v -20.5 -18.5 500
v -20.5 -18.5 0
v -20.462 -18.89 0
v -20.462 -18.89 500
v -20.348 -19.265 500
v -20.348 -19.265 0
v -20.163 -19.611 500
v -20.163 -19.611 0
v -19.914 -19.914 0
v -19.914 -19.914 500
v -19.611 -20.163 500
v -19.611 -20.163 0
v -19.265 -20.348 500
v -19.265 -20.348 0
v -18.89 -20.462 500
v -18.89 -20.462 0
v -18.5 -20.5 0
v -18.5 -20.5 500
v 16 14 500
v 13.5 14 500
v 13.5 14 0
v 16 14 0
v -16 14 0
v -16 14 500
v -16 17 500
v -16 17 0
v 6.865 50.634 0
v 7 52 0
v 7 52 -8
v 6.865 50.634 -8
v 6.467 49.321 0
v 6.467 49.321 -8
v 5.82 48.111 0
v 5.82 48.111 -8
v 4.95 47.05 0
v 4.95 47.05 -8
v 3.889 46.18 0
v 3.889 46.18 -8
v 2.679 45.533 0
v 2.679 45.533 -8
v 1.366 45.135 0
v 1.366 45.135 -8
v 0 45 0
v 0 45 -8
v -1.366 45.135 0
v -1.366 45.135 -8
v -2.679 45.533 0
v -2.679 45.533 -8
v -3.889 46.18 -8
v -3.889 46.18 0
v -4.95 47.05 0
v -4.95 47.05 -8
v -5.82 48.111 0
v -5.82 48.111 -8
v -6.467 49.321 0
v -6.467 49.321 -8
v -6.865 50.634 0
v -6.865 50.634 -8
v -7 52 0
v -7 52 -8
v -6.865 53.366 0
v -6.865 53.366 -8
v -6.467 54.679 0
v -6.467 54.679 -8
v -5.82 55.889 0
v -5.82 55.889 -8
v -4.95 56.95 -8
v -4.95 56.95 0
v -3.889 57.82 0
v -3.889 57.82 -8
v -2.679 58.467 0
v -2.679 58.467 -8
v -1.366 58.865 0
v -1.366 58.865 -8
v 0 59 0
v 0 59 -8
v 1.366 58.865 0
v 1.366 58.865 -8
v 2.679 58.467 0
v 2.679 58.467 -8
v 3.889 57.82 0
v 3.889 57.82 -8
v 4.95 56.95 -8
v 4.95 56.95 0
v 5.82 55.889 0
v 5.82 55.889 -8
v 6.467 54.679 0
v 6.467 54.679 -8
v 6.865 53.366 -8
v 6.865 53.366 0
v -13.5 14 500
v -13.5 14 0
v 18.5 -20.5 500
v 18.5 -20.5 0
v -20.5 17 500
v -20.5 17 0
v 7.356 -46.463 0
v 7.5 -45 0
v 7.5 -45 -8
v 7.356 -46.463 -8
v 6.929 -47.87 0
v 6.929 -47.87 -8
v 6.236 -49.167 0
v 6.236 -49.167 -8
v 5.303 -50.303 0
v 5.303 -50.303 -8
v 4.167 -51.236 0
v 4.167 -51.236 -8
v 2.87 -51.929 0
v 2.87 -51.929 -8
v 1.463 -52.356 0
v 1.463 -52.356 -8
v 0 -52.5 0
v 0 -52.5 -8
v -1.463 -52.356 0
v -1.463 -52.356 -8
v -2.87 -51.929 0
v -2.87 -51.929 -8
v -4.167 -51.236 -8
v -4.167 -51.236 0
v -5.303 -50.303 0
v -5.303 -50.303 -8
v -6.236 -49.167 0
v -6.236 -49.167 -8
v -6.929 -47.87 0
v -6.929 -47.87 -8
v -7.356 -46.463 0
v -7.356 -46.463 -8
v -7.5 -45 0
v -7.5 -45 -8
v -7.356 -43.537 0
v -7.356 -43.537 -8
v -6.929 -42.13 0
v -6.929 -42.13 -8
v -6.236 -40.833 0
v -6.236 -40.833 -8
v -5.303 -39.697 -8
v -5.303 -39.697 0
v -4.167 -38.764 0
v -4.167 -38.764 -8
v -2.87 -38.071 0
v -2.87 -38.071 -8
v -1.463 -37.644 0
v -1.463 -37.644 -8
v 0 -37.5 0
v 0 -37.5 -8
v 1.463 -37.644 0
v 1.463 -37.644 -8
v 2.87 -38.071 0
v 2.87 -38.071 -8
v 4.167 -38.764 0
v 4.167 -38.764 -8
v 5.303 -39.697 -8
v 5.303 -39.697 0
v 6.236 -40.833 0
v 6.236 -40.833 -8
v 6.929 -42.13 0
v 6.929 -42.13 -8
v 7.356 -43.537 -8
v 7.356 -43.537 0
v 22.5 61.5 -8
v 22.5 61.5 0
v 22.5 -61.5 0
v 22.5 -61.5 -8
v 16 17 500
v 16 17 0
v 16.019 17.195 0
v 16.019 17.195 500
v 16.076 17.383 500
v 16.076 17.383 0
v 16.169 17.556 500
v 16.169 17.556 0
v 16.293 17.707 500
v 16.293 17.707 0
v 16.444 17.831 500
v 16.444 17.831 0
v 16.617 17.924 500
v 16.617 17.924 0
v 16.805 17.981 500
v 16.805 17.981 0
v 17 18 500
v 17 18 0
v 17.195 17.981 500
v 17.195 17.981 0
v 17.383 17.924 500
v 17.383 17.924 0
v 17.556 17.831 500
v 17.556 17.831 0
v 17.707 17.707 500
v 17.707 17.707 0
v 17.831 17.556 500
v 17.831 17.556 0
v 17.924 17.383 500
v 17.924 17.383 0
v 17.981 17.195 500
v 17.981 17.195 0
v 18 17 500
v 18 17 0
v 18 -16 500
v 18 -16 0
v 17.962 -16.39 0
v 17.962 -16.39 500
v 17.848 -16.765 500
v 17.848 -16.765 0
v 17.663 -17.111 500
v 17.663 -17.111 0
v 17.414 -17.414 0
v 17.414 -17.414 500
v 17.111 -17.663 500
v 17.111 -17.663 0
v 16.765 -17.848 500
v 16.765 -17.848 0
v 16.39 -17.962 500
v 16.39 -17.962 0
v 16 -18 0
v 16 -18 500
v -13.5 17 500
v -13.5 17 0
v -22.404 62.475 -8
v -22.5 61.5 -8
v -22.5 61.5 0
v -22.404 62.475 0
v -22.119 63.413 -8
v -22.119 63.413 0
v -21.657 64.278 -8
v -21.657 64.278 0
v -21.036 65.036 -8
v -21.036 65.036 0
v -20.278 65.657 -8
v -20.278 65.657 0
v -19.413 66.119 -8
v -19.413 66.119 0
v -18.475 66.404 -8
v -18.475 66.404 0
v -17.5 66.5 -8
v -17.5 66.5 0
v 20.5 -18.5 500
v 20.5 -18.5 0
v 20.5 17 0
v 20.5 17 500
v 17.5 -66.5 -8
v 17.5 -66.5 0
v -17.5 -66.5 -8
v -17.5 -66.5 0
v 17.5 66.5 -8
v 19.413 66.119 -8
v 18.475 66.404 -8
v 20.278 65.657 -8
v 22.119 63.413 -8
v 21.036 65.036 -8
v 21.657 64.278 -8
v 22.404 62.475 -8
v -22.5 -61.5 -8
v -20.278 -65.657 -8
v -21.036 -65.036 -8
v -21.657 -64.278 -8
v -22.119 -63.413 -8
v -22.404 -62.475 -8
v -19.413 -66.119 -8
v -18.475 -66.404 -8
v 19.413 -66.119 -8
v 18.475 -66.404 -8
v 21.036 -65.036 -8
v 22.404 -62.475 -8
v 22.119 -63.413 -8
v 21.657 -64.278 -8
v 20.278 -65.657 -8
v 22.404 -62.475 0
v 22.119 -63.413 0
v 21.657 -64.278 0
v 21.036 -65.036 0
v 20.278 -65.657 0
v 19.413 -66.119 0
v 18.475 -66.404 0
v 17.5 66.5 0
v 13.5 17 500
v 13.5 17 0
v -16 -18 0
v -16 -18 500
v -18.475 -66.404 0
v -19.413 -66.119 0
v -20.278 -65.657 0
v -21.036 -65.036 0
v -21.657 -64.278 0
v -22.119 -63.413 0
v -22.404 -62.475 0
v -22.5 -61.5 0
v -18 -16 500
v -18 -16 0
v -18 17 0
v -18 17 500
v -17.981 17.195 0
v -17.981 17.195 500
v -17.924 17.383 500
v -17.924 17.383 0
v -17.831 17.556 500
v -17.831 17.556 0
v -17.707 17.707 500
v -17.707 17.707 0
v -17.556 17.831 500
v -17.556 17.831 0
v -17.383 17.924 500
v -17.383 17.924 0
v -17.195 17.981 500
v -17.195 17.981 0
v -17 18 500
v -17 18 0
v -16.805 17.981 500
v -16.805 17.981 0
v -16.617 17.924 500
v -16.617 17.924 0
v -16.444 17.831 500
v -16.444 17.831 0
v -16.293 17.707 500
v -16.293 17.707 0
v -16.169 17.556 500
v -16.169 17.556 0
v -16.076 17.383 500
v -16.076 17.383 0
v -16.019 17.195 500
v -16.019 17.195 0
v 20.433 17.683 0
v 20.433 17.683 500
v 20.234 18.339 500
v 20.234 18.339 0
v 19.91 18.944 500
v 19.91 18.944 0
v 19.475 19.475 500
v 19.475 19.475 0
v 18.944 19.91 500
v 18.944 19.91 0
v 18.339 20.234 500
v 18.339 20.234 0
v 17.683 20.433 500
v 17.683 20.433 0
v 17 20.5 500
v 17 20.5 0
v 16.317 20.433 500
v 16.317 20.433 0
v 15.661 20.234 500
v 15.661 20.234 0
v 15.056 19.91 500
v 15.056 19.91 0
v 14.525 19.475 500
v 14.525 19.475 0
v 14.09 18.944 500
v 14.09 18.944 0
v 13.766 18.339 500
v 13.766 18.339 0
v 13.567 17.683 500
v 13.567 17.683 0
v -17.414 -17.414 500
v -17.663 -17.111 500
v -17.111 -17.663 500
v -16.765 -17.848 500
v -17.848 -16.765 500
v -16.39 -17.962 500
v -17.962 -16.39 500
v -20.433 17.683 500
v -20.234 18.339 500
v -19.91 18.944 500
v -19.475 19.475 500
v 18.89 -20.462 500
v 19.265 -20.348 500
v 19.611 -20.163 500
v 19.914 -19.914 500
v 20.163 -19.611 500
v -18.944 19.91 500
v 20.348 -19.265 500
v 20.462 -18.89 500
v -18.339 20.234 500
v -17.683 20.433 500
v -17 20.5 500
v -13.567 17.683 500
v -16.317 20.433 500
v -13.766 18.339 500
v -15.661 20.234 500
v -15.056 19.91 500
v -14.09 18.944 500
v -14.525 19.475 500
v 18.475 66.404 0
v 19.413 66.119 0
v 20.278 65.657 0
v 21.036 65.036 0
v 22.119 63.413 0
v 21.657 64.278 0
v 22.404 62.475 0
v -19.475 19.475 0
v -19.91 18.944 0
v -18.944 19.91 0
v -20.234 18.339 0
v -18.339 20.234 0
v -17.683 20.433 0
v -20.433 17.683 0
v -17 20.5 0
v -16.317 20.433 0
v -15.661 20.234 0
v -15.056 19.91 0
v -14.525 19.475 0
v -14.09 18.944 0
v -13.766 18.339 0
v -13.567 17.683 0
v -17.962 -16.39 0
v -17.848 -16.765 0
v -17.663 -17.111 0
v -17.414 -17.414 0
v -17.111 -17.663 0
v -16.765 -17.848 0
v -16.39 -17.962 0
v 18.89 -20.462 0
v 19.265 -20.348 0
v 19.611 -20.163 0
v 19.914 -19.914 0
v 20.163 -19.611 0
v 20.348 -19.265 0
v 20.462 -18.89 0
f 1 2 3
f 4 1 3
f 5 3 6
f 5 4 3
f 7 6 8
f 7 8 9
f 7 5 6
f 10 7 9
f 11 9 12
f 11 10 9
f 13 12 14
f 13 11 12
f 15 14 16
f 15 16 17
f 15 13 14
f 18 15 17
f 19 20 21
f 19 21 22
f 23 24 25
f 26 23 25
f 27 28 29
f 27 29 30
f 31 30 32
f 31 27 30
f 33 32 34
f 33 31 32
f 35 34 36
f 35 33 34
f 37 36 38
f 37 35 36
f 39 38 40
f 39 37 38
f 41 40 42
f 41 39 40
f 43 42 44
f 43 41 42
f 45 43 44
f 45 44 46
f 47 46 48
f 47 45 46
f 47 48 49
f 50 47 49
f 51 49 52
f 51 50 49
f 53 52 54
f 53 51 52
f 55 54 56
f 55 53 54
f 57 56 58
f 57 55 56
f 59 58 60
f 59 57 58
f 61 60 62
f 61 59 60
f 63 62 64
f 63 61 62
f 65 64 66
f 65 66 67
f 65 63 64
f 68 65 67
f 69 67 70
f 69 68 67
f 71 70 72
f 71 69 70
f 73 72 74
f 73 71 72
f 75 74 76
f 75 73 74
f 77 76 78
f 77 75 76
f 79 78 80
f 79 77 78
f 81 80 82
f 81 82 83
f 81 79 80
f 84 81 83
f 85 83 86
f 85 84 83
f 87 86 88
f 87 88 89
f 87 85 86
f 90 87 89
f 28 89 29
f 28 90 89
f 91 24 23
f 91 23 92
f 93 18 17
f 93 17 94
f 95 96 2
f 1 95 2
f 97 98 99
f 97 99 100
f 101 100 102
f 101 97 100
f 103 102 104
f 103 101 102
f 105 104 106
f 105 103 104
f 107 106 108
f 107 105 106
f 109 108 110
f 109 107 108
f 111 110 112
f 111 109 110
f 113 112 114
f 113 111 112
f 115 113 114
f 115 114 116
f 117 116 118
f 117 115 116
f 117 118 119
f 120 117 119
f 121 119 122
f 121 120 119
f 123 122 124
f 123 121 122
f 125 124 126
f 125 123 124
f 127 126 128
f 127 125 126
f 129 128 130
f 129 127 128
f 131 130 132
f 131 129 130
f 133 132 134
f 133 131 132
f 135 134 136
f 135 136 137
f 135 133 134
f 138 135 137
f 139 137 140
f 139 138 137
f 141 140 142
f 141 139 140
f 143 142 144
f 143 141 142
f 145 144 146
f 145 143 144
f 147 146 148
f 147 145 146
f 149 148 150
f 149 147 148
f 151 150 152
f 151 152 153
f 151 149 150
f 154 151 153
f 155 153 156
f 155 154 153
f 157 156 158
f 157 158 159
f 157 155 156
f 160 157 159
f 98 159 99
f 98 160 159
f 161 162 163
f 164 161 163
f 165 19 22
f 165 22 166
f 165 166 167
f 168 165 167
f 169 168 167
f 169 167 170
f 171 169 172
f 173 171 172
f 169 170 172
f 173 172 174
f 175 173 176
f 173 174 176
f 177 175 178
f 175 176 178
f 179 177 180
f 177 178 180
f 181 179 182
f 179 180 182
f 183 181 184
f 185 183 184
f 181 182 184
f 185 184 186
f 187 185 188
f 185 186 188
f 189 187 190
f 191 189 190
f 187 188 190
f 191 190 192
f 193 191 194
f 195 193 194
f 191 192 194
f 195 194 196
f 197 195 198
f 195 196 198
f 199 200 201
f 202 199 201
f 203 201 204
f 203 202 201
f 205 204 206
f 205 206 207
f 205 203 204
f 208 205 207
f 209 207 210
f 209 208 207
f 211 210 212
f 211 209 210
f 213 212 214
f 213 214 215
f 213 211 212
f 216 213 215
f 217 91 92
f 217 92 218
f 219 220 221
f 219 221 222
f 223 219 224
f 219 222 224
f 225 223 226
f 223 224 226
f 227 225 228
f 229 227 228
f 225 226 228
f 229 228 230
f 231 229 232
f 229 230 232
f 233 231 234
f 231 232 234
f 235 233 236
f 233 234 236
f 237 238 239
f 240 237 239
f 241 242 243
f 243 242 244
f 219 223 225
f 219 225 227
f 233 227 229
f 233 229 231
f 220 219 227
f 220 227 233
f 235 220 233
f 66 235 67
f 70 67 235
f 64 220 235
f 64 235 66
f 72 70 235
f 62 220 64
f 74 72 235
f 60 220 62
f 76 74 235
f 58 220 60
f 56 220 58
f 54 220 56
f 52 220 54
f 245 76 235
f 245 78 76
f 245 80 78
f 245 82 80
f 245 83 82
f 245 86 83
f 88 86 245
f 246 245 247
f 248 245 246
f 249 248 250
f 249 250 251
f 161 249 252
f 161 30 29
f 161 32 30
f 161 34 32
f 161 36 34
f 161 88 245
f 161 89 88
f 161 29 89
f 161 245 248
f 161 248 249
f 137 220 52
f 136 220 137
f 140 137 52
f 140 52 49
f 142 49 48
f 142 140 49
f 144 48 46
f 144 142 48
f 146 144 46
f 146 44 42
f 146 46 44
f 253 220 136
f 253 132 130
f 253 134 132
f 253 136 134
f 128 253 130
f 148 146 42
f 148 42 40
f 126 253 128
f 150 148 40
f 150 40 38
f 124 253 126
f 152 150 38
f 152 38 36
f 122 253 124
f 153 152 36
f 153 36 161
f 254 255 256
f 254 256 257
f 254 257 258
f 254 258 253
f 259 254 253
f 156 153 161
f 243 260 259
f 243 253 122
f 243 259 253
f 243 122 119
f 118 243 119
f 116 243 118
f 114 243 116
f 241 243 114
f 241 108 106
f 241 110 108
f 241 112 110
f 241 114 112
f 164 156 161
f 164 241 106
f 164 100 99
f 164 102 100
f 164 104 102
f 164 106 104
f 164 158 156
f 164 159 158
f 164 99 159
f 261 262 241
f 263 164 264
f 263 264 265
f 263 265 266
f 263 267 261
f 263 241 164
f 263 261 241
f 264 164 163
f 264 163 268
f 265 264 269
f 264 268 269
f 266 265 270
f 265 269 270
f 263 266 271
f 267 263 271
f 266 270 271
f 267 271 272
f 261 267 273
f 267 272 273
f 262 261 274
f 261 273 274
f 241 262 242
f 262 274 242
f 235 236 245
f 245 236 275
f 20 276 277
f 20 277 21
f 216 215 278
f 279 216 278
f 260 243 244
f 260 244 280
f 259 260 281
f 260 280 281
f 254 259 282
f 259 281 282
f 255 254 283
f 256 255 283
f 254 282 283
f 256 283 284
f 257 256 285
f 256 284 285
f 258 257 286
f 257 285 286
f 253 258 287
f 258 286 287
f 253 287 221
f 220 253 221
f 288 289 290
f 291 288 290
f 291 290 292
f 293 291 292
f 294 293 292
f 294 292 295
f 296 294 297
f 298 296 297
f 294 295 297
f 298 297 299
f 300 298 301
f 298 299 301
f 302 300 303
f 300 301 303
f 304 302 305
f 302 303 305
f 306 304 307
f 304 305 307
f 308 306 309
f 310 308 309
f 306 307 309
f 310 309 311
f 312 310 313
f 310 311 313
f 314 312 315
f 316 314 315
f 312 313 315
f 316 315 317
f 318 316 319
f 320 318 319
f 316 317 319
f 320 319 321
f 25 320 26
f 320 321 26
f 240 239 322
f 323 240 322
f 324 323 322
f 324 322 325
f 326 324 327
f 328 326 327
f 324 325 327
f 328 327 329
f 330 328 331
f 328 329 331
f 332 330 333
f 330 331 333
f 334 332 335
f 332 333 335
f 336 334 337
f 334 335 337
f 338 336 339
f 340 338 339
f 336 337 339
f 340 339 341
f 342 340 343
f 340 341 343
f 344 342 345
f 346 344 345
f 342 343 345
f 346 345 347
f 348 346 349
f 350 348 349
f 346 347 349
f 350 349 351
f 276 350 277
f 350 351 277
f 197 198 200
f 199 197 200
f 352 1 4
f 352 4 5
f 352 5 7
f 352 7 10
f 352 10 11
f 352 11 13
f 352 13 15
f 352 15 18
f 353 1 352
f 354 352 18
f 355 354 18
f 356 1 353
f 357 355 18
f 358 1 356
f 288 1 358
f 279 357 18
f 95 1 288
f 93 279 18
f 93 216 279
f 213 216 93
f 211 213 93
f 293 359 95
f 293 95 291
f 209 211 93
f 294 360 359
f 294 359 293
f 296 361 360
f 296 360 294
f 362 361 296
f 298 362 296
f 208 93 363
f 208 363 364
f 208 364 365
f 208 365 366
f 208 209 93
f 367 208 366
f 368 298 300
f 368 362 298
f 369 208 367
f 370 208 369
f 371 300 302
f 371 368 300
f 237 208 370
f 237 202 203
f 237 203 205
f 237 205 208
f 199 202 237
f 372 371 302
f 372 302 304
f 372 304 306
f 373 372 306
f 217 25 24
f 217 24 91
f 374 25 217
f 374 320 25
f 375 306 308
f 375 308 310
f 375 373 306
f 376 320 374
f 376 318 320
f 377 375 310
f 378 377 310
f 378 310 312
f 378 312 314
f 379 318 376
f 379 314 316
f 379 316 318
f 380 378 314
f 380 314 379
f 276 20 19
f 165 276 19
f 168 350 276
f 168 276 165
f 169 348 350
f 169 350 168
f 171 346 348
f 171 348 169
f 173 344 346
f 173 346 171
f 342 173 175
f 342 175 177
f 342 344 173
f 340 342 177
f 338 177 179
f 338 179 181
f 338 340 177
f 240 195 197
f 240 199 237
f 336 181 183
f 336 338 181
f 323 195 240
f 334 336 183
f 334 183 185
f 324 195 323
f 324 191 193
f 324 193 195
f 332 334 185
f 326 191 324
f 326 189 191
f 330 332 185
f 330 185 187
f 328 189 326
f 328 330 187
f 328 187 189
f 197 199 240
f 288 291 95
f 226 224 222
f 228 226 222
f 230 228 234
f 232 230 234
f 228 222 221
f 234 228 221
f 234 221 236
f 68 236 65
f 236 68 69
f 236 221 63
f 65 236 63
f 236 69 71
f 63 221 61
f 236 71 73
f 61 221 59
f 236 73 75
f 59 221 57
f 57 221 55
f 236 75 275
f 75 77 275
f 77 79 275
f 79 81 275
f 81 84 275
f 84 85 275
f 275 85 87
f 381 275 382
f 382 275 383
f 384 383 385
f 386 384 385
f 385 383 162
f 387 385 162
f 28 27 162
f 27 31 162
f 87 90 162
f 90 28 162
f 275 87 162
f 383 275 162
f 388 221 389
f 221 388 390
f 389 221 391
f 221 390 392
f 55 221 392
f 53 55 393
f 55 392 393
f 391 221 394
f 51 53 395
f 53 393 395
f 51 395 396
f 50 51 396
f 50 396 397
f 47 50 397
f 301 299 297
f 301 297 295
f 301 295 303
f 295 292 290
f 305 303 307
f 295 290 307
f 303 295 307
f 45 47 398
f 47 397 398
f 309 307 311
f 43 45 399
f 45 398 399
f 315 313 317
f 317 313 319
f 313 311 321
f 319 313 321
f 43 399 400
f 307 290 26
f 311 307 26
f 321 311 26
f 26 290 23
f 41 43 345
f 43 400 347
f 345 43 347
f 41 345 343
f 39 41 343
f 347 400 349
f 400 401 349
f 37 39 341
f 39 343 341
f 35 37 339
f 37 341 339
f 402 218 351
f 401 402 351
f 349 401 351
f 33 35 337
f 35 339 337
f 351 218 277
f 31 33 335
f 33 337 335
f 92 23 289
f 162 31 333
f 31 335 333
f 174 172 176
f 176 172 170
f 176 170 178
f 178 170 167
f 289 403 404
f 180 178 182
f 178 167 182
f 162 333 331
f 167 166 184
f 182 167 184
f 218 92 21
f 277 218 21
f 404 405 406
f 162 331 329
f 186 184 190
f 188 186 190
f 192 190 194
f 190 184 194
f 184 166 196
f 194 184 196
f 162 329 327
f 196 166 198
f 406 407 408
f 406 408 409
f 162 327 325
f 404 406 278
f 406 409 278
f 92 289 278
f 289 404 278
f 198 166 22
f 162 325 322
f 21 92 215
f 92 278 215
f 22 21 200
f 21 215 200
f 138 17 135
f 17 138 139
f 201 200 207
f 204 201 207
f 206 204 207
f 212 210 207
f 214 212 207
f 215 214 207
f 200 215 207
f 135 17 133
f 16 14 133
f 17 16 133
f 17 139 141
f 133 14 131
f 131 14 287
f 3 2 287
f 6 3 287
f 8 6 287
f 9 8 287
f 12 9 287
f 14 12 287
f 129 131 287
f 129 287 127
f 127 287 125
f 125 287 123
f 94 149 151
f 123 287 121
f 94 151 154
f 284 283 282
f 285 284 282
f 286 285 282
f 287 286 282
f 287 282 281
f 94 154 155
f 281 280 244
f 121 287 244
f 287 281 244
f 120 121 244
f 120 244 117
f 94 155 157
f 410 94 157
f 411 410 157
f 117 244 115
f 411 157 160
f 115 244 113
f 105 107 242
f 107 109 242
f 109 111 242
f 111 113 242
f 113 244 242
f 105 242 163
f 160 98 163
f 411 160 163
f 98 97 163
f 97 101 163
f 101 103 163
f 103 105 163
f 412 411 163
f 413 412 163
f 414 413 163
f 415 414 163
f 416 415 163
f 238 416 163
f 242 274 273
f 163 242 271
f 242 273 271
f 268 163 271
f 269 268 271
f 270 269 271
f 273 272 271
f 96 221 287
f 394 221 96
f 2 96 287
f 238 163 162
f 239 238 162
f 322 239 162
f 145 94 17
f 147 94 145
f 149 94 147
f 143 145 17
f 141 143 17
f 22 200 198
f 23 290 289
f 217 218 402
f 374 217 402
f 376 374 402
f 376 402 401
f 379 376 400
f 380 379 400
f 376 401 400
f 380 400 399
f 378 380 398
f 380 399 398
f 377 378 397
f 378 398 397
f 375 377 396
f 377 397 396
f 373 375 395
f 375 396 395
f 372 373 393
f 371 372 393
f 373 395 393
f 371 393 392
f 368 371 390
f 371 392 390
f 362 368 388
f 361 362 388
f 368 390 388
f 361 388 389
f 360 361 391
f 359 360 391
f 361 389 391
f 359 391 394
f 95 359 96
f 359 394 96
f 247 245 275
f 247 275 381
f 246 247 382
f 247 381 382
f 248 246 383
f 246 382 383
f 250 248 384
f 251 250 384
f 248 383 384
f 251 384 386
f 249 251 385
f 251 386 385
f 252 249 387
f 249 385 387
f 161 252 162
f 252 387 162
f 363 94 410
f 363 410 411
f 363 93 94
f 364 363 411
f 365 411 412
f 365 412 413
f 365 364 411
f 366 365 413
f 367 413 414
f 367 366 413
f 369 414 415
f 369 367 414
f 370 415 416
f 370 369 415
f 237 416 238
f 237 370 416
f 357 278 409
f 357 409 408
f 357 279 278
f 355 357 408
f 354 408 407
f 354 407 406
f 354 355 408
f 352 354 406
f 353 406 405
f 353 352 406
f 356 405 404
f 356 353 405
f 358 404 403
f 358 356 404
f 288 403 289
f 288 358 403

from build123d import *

# Parameters (mm, degrees)
F0_W     = 2.5
F0_H     = 3
F1_DEPTH = 500
F2_R     = 2
F3_R     = 7
F3_R_2   = 7.5
F4_DEPTH = 8


with BuildPart() as f1:
    # F0 (on Top) → F1 (new body)
    with BuildSketch(Plane.XY):
        with BuildLine():
            Line((-20.5, 17), (-20.5, -20.5))
            Line((-20.5, -20.5), (20.5, -20.5))
            Line((20.5, -20.5), (20.5, 17))
            ThreePointArc((20.5, 17), (17, 20.5), (13.5, 17))
            Line((13.5, 17), (13.5, 14))
            Line((13.5, 14), (16, 14))
            Line((16, 14), (16, 17))
            ThreePointArc((16, 17), (17, 18), (18, 17))
            Line((18, 17), (18, -18))
            Line((18, -18), (-18, -18))
            Line((-18, -18), (-18, 17))
            ThreePointArc((-18, 17), (-17, 18), (-16, 17))
            Line((-16, 17), (-13.5, 17))
            ThreePointArc((-13.5, 17), (-17, 20.5), (-20.5, 17))
        make_face()
        with Locations((-14.75, 15.5)):
            Rectangle(F0_W, F0_H)
    extrude(amount=F1_DEPTH)

    # F2
    f2_edges = [f1.edges().sort_by_distance(p)[0] for p in [
        (-20.5, -20.5, 250),
        (20.5, -20.5, 250),
        (-18, -18, 250),
        (18, -18, 250),
    ]]
    fillet(f2_edges, radius=F2_R)

    # F3 (on face) → F4 (join)
    with BuildSketch(Plane(origin=(0, 0, 0), x_dir=(1, 0, 0), z_dir=(0, 0, -1))):
        with BuildLine():
            Line((17.5, 66.5), (-17.5, 66.5))
            ThreePointArc((-17.5, 66.5), (-21.035534, 65.035534), (-22.5, 61.5))
            Line((-22.5, 61.5), (-22.5, -61.5))
            ThreePointArc((-22.5, -61.5), (-21.035534, -65.035534), (-17.5, -66.5))
            Line((-17.5, -66.5), (17.5, -66.5))
            ThreePointArc((17.5, -66.5), (21.035534, -65.035534), (22.5, -61.5))
            Line((22.5, -61.5), (22.5, 61.5))
            ThreePointArc((22.5, 61.5), (21.035534, 65.035534), (17.5, 66.5))
        make_face()
        with Locations((0, -52)):
            Circle(F3_R, mode=Mode.SUBTRACT)
        with Locations((0, 45)):
            Circle(F3_R_2, mode=Mode.SUBTRACT)
    extrude(amount=F4_DEPTH)


solid = f1.part
